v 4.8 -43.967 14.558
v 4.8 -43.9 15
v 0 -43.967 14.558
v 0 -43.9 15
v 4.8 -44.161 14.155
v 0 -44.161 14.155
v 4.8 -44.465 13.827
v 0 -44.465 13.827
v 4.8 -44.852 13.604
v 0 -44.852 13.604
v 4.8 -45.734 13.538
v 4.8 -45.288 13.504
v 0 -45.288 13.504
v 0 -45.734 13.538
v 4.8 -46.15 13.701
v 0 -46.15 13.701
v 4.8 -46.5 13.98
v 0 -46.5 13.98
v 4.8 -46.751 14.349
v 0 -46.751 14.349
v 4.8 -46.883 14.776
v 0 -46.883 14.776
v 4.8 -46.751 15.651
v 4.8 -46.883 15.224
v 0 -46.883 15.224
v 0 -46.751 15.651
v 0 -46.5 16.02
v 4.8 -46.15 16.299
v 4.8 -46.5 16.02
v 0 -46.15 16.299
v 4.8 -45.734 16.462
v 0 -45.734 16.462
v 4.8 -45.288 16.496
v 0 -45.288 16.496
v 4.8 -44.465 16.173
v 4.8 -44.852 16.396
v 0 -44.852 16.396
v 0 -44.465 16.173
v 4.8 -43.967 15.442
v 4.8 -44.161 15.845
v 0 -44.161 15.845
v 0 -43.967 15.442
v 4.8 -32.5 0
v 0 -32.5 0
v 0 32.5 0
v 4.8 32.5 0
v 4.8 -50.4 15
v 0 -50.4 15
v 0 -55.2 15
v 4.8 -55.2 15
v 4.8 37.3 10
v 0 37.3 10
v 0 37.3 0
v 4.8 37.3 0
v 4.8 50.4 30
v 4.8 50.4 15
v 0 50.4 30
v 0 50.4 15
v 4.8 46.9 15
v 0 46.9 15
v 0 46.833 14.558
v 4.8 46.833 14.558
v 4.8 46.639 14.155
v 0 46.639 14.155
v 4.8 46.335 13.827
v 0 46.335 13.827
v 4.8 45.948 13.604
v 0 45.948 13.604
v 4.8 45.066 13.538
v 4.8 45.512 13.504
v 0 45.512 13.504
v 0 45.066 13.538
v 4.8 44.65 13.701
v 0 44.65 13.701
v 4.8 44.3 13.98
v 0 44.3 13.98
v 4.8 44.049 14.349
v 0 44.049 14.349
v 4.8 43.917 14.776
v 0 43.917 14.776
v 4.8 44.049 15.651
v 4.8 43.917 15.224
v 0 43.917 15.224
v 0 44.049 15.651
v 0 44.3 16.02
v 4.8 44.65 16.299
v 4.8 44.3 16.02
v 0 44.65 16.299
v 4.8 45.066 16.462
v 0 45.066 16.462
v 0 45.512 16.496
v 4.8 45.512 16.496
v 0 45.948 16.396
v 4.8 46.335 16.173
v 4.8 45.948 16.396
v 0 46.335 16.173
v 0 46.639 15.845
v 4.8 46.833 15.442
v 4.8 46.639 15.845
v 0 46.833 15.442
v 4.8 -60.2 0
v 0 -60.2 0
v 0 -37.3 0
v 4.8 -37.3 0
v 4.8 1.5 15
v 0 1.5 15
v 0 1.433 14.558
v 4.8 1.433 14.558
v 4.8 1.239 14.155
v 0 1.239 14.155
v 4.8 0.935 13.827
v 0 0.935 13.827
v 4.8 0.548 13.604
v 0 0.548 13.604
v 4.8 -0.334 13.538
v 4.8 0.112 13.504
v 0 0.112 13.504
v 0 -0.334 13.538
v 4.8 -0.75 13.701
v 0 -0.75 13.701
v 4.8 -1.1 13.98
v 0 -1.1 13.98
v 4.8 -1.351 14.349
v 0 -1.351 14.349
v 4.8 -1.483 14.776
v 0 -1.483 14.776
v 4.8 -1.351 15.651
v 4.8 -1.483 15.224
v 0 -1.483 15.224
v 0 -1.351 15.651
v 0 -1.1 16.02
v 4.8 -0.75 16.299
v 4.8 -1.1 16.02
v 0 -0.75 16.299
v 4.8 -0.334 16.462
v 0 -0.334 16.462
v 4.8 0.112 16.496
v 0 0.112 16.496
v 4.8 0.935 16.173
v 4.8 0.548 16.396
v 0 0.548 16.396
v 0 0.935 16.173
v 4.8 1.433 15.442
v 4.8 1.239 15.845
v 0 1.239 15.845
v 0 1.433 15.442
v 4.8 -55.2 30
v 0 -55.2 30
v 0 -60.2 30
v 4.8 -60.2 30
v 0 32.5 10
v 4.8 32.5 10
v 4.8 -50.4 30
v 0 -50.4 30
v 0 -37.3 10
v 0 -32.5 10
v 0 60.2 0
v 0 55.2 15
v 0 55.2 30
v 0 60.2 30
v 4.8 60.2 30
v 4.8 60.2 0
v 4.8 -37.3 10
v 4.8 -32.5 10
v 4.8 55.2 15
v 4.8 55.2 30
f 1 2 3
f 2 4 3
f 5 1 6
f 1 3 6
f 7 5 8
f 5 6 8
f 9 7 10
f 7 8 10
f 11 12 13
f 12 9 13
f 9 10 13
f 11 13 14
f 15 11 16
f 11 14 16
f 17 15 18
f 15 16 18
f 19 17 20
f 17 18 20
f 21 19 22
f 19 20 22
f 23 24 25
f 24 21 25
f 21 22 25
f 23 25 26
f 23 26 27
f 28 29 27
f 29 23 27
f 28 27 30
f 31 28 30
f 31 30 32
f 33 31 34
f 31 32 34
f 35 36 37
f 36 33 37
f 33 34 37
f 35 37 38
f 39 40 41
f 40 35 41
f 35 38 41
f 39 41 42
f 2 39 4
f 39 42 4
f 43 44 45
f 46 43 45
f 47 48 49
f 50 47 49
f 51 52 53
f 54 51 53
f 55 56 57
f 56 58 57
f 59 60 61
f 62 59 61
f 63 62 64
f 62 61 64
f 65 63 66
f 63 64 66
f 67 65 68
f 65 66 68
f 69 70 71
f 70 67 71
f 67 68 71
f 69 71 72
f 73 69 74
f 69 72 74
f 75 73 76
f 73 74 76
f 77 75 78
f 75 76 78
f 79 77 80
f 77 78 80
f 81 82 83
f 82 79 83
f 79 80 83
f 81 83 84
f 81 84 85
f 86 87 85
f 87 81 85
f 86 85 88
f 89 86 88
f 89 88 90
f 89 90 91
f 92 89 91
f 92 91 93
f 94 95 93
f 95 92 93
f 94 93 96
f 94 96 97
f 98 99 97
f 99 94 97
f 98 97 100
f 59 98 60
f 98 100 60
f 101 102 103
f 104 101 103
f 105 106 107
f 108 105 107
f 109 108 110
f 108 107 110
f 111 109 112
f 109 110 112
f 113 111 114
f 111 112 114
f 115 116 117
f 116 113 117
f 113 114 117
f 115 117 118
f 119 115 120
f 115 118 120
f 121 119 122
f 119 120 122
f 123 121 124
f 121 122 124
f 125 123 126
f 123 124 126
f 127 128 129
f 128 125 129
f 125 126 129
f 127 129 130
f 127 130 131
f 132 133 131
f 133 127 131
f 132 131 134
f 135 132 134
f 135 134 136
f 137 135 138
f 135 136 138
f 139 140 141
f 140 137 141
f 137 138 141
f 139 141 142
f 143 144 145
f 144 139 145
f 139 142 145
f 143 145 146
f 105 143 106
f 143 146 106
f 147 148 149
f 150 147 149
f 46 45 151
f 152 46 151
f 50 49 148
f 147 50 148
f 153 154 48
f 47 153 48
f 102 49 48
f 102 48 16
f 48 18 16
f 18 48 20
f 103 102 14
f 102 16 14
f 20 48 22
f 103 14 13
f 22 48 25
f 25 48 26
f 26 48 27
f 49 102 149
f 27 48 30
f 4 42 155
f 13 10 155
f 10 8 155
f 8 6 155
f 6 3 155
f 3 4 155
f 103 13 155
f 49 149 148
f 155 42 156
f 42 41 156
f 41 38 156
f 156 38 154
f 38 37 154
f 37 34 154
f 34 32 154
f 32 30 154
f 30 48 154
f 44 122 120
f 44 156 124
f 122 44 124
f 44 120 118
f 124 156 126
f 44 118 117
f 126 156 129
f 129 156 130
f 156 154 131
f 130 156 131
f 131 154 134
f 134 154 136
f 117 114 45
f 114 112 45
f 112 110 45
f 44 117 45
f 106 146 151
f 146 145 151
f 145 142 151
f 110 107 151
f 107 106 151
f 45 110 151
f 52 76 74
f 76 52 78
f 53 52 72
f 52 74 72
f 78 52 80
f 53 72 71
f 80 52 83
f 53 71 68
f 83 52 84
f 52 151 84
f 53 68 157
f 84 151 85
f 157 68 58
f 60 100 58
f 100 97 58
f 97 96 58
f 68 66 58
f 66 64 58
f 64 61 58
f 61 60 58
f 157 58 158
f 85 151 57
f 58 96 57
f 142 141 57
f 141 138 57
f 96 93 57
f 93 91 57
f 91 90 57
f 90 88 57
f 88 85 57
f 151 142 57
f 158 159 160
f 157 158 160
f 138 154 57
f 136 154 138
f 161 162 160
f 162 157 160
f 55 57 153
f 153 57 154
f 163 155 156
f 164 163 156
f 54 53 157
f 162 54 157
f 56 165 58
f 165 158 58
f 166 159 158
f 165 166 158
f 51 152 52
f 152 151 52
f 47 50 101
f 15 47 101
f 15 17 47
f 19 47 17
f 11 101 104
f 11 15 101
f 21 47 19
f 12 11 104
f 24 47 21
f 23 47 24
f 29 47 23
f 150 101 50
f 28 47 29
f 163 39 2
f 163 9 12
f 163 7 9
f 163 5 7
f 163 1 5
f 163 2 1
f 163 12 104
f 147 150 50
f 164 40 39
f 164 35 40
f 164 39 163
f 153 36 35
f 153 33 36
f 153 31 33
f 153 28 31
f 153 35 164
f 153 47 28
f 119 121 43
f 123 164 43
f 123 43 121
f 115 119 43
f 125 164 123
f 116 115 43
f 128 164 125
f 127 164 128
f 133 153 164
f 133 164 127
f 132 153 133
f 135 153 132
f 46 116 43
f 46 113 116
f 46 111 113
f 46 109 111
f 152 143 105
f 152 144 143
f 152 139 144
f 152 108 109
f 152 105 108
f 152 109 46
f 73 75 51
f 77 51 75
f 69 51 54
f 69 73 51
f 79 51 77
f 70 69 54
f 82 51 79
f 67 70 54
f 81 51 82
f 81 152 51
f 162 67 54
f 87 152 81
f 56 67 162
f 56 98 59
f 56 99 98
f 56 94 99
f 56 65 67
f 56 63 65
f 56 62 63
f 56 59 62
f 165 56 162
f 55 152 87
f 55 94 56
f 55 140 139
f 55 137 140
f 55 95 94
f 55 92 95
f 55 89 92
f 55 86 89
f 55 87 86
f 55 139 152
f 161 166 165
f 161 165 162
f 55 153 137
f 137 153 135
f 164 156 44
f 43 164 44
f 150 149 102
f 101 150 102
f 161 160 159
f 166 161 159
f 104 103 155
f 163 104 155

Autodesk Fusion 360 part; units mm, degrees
sketch "Sketch1" plane through (0, 0, 0) normal (1, 0, 0) x (0, 1, 0)
  line L0 (-60.2, 30) -> (-60.2, 0)
  line L1 (-60.2, 0) -> (-37.3, 0)
  line L2 (-37.3, 0) -> (-37.3, 10)
  line L3 (-37.3, 10) -> (-32.5, 10)
  line L4 (-32.5, 10) -> (-32.5, 0)
  line L5 (-32.5, 0) -> (32.5, 0)
  line L6 (32.5, 0) -> (32.5, 10)
  line L7 (32.5, 10) -> (37.3, 10)
  line L8 (37.3, 10) -> (37.3, 0)
  line L9 (37.3, 0) -> (60.2, 0)
  line L10 (60.2, 0) -> (60.2, 30)
  line L11 (60.2, 30) -> (55.2, 30)
  line L12 (55.2, 30) -> (55.2, 15)
  line L13 (55.2, 15) -> (50.4, 15)
  line L14 (50.4, 15) -> (50.4, 30)
  line L15 (50.4, 30) -> (-50.4, 30)
  line L16 (-50.4, 30) -> (-50.4, 15)
  line L17 (-50.4, 15) -> (-55.2, 15)
  line L18 (-55.2, 15) -> (-55.2, 30)
  line L19 (-55.2, 30) -> (-60.2, 30)
  line L20 (-55.2, 30) -> (-50.4, 30) construction
  line L21 (50.4, 30) -> (55.2, 30) construction
  line L22 (37.3, 0) -> (32.5, 0) construction
  line L23 (-32.5, 0) -> (-37.3, 0) construction
  line L24 (-50.4, 15) -> (50.4, 15) construction
  line L25 (0, 0) -> (0, 15) construction
  line L26 (0, 15) -> (0, 30) construction
  circle A0 centre (0, 15) radius 1.5
  circle A1 centre (-45.4, 15) radius 1.5
  circle A2 centre (45.4, 15) radius 1.5
  line L27 (-32.5, 10) -> (32.5, 10) construction
  point P0 (0, 15)
  point P1 (0, 15)
  point P2 (0, 30)
  dimension "d1" = 4.8
  dimension "d2" = 4.8
  dimension "d3" = 4.8
  dimension "d4" = 4.8
  dimension "d7" = 15
  dimension "d9" = 30
  dimension "d10" = 65
  dimension "d11" = 120.4
  dimension "d12" = 100.8
  dimension "d13" = 5
  dimension "d14" = 3
  dimension "d15" = 3
  dimension "d16" = 5
  dimension "d17" = 3
  dimension "d18" = 5
  dimension "d21" = 10
extrude "Extrude1" add sketch "Sketch1" along normal blind 4.8
